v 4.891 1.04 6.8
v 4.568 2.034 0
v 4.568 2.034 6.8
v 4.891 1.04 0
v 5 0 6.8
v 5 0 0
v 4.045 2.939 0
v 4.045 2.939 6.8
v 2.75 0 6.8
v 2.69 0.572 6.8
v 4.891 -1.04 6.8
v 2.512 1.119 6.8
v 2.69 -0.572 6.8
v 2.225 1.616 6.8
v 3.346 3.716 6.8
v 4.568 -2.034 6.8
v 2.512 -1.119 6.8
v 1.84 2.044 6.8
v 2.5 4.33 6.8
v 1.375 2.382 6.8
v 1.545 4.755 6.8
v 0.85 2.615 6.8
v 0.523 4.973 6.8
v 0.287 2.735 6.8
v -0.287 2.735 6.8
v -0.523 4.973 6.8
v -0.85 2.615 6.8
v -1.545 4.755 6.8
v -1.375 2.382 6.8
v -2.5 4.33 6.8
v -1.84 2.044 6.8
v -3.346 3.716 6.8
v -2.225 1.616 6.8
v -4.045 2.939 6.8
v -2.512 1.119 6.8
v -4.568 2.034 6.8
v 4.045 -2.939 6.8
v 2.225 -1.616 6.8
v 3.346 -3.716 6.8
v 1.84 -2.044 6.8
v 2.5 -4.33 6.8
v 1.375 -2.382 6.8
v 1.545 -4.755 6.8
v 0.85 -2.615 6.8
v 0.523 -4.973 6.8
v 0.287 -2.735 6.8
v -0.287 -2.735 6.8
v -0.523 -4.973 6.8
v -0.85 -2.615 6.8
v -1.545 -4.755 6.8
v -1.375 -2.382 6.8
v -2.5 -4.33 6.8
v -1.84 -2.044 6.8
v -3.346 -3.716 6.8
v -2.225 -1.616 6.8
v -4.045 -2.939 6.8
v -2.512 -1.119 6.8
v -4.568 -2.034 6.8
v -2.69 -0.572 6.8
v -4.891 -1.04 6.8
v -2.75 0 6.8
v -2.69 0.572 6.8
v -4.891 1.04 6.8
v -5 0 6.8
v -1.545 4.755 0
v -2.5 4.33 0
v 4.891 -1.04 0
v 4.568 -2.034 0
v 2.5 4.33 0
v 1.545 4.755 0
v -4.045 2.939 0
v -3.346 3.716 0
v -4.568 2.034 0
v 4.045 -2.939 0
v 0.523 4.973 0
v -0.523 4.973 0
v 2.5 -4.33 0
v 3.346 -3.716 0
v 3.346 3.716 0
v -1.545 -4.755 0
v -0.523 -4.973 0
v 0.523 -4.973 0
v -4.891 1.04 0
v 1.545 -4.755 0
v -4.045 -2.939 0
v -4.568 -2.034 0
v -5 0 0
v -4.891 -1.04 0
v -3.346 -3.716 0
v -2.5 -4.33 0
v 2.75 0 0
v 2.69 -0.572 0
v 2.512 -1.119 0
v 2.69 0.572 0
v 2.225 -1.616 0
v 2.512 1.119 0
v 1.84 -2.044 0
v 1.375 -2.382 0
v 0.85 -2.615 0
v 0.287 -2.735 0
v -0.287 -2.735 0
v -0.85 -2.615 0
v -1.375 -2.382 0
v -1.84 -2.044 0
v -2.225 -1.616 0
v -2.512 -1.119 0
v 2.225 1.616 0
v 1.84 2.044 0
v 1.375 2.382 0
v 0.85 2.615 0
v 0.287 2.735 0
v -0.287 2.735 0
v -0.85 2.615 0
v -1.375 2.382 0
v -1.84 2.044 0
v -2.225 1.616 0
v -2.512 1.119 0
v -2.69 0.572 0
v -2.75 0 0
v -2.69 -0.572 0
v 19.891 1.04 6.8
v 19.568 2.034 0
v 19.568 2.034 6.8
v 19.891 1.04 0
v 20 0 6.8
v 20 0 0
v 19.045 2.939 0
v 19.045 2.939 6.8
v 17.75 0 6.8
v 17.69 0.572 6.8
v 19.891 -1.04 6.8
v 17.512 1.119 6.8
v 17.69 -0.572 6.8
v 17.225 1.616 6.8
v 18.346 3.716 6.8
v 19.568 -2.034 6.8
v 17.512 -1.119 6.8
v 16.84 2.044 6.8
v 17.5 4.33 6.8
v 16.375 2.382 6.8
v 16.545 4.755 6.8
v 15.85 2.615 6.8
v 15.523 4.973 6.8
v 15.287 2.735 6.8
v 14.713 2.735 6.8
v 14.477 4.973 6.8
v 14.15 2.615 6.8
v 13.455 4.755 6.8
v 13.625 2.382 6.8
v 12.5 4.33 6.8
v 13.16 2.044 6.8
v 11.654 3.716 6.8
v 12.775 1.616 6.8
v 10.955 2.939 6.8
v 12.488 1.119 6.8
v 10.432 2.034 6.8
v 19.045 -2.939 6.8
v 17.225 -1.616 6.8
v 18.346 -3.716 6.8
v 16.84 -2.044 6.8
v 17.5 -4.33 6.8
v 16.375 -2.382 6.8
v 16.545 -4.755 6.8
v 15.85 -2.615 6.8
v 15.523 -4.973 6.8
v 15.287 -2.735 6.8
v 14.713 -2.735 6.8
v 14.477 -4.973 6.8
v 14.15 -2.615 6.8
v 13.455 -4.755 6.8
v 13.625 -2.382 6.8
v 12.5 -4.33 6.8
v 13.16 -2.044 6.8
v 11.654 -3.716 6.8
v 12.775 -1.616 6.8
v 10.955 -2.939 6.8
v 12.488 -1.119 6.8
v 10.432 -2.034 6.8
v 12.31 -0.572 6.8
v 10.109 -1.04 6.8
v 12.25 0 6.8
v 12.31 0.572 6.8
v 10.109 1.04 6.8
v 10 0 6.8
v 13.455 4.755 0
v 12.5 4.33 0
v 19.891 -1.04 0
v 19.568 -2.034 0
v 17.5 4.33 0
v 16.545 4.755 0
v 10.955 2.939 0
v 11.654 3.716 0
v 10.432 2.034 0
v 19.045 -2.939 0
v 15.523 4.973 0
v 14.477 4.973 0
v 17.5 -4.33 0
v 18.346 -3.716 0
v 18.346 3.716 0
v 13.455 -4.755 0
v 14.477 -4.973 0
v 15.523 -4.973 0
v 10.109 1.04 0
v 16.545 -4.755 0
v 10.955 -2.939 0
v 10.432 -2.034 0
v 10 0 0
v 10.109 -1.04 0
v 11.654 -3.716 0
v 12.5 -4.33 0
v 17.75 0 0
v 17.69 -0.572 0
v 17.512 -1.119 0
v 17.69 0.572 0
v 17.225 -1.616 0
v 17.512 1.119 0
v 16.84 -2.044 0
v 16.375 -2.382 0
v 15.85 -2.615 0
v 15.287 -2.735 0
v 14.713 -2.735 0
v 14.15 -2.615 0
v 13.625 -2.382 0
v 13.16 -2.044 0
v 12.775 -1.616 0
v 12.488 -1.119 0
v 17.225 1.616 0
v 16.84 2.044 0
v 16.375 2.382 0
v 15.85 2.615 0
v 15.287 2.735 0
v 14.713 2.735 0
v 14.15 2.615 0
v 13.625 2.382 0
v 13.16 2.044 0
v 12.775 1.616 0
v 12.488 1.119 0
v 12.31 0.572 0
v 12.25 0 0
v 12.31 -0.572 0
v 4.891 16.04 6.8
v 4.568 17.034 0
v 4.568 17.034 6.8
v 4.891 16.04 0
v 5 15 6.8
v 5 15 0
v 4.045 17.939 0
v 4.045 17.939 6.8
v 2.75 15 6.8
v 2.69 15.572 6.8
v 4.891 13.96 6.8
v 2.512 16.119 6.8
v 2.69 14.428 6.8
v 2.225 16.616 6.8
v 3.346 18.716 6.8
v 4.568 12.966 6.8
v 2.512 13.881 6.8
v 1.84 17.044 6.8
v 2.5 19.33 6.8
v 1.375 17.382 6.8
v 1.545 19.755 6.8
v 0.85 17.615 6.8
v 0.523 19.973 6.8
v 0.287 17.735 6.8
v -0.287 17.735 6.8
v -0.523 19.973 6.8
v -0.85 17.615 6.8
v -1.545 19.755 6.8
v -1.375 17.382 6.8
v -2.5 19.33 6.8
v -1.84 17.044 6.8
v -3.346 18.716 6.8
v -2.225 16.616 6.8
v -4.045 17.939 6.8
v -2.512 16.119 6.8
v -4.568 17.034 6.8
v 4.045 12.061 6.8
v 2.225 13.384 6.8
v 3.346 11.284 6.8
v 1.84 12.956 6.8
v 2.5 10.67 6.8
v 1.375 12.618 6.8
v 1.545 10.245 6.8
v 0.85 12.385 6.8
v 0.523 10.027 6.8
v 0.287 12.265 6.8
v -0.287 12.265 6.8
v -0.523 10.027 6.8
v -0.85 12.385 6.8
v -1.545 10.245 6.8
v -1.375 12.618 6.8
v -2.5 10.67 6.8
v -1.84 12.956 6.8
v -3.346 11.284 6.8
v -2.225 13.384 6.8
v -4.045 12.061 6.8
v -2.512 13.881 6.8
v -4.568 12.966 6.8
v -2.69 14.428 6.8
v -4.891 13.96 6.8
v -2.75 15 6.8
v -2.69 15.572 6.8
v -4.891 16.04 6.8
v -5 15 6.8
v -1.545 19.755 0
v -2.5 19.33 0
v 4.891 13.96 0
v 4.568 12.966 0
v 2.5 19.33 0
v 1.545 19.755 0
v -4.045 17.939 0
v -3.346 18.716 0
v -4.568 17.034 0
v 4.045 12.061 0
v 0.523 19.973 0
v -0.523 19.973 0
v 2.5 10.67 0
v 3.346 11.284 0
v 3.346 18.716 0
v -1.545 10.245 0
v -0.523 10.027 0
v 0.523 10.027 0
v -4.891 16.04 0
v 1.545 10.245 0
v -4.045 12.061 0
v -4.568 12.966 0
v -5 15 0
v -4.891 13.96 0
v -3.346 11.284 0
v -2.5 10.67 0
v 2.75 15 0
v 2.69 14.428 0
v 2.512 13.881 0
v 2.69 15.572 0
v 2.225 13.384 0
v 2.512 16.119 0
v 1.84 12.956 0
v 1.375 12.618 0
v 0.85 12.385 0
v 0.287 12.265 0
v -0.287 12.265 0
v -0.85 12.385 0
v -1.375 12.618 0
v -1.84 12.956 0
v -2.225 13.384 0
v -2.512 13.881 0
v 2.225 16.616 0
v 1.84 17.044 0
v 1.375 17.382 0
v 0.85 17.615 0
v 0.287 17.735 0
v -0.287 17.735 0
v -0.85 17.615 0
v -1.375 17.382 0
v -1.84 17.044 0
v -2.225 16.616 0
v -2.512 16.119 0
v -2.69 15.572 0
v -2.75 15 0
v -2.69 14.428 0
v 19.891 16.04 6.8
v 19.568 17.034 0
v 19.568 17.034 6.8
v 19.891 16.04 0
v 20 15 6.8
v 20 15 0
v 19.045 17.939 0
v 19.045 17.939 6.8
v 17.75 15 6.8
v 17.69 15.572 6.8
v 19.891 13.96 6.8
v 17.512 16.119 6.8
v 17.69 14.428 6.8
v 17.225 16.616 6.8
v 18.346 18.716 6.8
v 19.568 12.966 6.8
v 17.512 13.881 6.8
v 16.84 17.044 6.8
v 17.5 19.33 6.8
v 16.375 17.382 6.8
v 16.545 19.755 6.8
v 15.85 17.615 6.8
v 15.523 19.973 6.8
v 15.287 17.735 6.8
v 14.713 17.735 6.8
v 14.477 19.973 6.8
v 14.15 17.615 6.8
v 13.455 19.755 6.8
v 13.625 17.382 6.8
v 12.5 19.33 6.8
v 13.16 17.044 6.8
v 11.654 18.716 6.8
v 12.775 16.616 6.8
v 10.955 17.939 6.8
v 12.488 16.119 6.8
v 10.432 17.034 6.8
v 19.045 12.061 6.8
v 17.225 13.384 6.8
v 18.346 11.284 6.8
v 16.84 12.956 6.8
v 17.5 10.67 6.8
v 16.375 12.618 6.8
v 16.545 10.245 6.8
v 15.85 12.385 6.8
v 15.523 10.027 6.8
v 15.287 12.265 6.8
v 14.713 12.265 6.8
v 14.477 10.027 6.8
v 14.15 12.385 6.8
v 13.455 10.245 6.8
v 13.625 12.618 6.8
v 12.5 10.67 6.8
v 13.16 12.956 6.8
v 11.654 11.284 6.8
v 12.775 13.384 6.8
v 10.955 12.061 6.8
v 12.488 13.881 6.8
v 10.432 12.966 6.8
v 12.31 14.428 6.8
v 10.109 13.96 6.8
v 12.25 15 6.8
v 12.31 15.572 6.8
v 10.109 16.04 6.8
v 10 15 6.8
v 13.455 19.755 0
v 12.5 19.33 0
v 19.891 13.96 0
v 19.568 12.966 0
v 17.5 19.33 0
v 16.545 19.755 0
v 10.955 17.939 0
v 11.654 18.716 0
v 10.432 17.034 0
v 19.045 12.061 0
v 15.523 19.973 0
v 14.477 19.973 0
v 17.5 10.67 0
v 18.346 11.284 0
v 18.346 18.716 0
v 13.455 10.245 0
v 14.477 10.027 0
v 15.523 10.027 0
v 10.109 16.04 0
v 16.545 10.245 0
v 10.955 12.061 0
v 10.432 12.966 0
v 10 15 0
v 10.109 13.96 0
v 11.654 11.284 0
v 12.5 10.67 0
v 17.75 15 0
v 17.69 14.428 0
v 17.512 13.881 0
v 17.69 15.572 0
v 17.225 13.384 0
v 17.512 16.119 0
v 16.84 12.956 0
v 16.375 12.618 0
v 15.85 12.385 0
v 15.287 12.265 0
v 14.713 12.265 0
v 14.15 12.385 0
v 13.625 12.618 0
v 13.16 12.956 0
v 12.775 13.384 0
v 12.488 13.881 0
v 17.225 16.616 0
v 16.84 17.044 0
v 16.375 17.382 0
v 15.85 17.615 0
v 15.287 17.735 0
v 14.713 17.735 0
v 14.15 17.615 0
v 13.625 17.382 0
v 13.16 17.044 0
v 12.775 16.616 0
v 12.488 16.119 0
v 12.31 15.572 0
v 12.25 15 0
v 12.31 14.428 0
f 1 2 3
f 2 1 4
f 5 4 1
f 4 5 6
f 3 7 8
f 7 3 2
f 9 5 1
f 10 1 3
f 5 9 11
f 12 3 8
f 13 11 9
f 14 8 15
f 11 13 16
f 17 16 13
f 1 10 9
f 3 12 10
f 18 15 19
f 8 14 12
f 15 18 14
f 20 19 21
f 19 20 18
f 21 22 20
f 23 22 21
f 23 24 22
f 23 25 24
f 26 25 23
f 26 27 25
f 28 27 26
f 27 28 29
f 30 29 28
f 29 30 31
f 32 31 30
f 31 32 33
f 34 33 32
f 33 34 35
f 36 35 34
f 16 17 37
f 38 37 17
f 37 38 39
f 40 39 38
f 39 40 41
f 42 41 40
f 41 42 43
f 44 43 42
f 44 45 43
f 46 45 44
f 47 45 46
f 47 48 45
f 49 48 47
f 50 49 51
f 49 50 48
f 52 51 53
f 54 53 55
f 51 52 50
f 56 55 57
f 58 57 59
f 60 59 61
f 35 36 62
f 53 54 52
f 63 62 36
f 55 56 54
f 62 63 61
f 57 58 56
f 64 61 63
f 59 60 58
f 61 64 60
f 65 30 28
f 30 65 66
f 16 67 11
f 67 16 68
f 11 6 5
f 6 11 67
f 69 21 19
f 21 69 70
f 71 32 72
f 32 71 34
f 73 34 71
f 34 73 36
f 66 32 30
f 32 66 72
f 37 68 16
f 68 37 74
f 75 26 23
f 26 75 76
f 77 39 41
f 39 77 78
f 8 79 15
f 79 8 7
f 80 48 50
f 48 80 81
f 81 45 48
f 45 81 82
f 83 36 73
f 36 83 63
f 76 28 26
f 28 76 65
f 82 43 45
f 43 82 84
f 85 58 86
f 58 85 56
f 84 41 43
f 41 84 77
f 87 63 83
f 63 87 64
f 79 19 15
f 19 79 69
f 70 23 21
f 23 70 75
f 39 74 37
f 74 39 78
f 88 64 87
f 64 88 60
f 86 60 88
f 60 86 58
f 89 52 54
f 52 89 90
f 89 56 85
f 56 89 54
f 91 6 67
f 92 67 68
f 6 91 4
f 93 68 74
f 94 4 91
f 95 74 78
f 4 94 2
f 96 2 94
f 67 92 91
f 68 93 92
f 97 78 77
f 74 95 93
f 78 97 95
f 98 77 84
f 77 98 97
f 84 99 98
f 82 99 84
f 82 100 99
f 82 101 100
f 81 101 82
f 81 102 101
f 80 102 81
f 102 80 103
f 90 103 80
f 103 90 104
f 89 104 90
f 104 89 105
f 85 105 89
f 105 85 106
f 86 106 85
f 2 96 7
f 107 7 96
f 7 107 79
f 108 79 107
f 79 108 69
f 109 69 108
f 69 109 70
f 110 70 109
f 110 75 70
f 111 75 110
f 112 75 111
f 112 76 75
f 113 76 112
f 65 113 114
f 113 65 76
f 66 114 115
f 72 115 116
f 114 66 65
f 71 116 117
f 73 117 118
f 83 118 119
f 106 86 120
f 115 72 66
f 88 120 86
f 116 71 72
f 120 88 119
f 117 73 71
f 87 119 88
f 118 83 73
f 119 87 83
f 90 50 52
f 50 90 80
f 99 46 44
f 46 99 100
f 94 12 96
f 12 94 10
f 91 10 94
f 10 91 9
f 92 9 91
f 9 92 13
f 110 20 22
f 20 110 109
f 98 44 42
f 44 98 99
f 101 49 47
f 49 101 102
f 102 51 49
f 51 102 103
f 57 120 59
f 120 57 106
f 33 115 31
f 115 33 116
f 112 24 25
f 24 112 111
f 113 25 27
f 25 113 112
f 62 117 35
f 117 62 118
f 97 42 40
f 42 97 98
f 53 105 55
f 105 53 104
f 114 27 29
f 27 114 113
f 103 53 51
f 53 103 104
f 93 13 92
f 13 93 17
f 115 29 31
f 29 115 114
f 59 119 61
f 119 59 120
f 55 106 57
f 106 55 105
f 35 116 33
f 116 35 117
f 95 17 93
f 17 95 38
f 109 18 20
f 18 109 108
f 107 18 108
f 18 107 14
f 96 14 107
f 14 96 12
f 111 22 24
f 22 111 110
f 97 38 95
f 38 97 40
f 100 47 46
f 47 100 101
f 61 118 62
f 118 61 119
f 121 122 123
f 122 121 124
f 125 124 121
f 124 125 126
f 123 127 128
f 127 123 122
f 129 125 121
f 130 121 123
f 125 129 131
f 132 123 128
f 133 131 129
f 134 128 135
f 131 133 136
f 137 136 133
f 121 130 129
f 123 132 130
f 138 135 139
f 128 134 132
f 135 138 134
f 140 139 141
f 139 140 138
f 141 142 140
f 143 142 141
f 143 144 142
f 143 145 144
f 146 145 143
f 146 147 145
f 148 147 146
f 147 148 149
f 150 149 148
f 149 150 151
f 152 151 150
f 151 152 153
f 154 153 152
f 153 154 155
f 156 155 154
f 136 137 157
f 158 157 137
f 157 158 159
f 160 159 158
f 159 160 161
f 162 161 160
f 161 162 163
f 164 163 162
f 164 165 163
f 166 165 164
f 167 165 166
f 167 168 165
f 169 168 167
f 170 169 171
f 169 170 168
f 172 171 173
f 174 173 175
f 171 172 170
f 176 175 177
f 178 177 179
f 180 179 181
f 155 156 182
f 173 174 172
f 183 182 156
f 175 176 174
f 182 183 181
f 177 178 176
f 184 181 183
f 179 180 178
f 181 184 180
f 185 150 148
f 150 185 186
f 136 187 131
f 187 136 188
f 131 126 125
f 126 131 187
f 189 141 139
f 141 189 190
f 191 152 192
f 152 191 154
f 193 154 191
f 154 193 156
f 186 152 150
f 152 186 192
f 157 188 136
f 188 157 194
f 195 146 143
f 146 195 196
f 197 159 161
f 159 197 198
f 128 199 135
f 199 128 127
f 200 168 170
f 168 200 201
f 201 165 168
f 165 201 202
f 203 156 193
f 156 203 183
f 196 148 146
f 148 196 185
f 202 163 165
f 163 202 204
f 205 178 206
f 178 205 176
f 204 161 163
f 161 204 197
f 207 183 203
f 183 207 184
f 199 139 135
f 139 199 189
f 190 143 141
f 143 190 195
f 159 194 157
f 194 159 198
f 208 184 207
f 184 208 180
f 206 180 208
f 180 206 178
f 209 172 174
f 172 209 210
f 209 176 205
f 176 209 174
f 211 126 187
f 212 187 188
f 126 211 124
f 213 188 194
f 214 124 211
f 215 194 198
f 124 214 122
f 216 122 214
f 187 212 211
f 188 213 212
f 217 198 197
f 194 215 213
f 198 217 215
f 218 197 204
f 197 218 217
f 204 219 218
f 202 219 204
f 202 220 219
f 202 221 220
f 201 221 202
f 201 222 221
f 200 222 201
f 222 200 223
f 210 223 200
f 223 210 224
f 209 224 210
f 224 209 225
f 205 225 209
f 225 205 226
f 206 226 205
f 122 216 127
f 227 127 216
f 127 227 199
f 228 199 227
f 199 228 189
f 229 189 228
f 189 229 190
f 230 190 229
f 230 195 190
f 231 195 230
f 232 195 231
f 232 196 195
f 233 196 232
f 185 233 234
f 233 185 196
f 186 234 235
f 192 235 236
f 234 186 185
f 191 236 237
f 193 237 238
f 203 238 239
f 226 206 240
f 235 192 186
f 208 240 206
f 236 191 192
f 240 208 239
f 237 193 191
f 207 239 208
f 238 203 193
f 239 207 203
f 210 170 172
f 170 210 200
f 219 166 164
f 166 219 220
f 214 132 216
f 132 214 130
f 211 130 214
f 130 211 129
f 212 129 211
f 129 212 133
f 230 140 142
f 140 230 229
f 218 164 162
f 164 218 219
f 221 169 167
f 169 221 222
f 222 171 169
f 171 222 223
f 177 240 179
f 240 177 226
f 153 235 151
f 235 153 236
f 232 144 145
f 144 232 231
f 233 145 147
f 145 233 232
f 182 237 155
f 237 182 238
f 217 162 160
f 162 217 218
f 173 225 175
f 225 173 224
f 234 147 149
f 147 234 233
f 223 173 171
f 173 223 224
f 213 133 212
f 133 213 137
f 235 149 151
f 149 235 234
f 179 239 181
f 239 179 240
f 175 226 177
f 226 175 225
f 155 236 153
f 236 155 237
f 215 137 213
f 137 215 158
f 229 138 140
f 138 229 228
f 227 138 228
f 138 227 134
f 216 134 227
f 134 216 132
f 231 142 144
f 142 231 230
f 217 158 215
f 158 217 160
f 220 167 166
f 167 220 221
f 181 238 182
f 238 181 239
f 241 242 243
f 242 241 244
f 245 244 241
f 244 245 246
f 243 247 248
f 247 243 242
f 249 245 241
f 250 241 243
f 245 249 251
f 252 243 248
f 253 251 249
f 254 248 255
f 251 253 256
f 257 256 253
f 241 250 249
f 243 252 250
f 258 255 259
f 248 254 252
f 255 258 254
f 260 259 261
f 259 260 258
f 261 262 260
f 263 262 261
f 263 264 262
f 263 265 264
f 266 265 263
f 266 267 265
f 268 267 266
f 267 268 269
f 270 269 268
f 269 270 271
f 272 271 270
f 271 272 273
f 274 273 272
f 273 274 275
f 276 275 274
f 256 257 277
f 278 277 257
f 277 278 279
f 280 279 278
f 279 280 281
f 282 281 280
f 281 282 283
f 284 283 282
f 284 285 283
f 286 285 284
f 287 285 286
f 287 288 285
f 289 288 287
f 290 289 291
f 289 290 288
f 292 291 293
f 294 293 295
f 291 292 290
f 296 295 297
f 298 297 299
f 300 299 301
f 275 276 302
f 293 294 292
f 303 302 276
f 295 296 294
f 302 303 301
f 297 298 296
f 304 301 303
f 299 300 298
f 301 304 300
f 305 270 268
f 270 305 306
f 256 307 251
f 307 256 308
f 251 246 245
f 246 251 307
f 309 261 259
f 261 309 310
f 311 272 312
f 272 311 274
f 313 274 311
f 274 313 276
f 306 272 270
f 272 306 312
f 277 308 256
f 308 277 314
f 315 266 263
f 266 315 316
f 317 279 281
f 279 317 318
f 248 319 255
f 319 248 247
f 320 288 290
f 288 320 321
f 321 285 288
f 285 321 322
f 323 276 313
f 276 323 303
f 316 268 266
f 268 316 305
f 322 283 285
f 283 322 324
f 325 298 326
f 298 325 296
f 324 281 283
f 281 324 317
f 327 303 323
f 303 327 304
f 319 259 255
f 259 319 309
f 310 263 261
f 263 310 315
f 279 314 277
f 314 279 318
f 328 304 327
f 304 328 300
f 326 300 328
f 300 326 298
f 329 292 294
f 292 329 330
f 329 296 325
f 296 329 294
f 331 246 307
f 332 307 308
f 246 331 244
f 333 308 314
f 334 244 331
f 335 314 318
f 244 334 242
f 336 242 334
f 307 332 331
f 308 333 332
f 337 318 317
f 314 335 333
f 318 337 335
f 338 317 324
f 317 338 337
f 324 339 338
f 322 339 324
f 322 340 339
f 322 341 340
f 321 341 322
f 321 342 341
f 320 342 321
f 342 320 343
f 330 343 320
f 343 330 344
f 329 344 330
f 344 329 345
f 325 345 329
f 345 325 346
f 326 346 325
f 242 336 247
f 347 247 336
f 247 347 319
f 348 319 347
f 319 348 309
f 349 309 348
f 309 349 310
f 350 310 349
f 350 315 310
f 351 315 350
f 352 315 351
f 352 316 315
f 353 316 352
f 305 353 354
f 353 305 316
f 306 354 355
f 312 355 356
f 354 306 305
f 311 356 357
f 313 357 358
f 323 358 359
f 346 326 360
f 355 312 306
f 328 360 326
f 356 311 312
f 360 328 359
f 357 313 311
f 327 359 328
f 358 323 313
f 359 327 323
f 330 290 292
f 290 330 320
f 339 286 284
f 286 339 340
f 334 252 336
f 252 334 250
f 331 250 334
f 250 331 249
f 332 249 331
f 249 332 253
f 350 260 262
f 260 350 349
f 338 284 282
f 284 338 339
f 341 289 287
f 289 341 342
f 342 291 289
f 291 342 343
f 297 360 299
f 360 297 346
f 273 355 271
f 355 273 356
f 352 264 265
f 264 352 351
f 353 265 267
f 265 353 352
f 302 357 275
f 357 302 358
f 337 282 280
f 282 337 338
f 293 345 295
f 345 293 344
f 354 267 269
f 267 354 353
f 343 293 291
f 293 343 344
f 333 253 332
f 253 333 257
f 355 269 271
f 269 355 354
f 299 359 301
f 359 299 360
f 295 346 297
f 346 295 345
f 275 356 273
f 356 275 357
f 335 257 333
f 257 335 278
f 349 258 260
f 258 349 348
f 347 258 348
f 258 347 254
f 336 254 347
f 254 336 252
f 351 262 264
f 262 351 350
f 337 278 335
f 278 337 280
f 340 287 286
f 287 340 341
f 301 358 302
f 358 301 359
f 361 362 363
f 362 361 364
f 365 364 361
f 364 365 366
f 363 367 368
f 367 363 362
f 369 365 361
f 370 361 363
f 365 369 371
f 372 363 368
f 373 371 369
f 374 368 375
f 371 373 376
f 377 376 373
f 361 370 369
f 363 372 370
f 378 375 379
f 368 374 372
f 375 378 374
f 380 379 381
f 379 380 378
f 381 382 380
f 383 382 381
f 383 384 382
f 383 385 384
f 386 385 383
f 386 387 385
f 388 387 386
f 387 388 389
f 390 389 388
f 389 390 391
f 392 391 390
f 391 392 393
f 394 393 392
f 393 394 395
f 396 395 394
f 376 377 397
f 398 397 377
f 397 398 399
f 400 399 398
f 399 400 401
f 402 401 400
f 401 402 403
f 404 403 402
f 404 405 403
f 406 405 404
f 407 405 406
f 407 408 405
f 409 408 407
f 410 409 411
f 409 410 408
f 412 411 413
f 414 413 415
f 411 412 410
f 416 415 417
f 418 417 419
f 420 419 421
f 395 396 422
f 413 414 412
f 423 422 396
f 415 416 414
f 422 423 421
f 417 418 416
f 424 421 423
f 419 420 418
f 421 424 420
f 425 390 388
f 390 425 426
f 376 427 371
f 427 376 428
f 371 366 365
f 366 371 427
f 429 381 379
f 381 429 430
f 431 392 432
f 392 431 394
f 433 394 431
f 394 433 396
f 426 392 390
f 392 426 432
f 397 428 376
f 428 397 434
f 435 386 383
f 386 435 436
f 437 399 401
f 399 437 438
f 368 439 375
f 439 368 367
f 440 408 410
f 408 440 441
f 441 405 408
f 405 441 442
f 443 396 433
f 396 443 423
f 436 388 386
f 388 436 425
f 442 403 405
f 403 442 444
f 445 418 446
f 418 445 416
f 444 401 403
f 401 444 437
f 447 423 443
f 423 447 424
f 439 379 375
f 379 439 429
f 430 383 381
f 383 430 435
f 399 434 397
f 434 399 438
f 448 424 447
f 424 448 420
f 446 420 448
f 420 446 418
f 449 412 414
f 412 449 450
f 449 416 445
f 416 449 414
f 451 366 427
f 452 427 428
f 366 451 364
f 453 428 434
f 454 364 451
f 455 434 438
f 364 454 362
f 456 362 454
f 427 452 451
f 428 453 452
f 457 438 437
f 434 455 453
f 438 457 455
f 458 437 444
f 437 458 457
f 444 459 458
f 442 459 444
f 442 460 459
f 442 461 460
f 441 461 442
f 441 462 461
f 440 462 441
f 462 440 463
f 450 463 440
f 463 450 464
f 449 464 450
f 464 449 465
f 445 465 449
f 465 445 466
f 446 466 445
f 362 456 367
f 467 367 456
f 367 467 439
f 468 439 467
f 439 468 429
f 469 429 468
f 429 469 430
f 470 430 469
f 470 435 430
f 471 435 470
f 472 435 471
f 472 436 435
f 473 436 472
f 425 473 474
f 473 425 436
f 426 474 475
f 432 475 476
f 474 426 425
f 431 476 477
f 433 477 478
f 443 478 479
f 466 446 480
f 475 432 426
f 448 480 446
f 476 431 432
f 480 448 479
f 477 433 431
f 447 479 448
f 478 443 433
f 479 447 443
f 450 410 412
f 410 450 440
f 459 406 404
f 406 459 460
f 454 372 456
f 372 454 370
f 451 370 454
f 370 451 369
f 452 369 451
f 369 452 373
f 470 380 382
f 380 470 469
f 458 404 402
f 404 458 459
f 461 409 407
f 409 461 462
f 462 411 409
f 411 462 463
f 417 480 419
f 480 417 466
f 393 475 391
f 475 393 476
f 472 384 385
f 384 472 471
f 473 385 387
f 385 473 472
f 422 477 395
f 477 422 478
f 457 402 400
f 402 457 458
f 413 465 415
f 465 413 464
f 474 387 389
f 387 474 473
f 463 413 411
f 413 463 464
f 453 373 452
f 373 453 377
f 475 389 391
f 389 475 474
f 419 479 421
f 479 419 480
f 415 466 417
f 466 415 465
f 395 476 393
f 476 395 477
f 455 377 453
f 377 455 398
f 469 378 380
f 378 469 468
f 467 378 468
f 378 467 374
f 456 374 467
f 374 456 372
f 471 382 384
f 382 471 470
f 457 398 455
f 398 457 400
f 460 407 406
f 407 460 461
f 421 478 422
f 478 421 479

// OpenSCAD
// Prism   
// Makerslide vertical X-end prototype for
// GNU GPL v2
// Charles Strang


$fn=30;

translate([0,0,0]) makerslidebushing();
translate([15,0,0]) makerslidebushing();
translate([0,15,0]) makerslidebushing();
translate([15,15,0]) makerslidebushing();

module makerslidebushing()
{
	
	difference()
	{
		translate([0,0,0]) cylinder(h=6.8,r=5);
		translate([0,0,-0.1]) cylinder(h=7,r=2.75);
	}


}
